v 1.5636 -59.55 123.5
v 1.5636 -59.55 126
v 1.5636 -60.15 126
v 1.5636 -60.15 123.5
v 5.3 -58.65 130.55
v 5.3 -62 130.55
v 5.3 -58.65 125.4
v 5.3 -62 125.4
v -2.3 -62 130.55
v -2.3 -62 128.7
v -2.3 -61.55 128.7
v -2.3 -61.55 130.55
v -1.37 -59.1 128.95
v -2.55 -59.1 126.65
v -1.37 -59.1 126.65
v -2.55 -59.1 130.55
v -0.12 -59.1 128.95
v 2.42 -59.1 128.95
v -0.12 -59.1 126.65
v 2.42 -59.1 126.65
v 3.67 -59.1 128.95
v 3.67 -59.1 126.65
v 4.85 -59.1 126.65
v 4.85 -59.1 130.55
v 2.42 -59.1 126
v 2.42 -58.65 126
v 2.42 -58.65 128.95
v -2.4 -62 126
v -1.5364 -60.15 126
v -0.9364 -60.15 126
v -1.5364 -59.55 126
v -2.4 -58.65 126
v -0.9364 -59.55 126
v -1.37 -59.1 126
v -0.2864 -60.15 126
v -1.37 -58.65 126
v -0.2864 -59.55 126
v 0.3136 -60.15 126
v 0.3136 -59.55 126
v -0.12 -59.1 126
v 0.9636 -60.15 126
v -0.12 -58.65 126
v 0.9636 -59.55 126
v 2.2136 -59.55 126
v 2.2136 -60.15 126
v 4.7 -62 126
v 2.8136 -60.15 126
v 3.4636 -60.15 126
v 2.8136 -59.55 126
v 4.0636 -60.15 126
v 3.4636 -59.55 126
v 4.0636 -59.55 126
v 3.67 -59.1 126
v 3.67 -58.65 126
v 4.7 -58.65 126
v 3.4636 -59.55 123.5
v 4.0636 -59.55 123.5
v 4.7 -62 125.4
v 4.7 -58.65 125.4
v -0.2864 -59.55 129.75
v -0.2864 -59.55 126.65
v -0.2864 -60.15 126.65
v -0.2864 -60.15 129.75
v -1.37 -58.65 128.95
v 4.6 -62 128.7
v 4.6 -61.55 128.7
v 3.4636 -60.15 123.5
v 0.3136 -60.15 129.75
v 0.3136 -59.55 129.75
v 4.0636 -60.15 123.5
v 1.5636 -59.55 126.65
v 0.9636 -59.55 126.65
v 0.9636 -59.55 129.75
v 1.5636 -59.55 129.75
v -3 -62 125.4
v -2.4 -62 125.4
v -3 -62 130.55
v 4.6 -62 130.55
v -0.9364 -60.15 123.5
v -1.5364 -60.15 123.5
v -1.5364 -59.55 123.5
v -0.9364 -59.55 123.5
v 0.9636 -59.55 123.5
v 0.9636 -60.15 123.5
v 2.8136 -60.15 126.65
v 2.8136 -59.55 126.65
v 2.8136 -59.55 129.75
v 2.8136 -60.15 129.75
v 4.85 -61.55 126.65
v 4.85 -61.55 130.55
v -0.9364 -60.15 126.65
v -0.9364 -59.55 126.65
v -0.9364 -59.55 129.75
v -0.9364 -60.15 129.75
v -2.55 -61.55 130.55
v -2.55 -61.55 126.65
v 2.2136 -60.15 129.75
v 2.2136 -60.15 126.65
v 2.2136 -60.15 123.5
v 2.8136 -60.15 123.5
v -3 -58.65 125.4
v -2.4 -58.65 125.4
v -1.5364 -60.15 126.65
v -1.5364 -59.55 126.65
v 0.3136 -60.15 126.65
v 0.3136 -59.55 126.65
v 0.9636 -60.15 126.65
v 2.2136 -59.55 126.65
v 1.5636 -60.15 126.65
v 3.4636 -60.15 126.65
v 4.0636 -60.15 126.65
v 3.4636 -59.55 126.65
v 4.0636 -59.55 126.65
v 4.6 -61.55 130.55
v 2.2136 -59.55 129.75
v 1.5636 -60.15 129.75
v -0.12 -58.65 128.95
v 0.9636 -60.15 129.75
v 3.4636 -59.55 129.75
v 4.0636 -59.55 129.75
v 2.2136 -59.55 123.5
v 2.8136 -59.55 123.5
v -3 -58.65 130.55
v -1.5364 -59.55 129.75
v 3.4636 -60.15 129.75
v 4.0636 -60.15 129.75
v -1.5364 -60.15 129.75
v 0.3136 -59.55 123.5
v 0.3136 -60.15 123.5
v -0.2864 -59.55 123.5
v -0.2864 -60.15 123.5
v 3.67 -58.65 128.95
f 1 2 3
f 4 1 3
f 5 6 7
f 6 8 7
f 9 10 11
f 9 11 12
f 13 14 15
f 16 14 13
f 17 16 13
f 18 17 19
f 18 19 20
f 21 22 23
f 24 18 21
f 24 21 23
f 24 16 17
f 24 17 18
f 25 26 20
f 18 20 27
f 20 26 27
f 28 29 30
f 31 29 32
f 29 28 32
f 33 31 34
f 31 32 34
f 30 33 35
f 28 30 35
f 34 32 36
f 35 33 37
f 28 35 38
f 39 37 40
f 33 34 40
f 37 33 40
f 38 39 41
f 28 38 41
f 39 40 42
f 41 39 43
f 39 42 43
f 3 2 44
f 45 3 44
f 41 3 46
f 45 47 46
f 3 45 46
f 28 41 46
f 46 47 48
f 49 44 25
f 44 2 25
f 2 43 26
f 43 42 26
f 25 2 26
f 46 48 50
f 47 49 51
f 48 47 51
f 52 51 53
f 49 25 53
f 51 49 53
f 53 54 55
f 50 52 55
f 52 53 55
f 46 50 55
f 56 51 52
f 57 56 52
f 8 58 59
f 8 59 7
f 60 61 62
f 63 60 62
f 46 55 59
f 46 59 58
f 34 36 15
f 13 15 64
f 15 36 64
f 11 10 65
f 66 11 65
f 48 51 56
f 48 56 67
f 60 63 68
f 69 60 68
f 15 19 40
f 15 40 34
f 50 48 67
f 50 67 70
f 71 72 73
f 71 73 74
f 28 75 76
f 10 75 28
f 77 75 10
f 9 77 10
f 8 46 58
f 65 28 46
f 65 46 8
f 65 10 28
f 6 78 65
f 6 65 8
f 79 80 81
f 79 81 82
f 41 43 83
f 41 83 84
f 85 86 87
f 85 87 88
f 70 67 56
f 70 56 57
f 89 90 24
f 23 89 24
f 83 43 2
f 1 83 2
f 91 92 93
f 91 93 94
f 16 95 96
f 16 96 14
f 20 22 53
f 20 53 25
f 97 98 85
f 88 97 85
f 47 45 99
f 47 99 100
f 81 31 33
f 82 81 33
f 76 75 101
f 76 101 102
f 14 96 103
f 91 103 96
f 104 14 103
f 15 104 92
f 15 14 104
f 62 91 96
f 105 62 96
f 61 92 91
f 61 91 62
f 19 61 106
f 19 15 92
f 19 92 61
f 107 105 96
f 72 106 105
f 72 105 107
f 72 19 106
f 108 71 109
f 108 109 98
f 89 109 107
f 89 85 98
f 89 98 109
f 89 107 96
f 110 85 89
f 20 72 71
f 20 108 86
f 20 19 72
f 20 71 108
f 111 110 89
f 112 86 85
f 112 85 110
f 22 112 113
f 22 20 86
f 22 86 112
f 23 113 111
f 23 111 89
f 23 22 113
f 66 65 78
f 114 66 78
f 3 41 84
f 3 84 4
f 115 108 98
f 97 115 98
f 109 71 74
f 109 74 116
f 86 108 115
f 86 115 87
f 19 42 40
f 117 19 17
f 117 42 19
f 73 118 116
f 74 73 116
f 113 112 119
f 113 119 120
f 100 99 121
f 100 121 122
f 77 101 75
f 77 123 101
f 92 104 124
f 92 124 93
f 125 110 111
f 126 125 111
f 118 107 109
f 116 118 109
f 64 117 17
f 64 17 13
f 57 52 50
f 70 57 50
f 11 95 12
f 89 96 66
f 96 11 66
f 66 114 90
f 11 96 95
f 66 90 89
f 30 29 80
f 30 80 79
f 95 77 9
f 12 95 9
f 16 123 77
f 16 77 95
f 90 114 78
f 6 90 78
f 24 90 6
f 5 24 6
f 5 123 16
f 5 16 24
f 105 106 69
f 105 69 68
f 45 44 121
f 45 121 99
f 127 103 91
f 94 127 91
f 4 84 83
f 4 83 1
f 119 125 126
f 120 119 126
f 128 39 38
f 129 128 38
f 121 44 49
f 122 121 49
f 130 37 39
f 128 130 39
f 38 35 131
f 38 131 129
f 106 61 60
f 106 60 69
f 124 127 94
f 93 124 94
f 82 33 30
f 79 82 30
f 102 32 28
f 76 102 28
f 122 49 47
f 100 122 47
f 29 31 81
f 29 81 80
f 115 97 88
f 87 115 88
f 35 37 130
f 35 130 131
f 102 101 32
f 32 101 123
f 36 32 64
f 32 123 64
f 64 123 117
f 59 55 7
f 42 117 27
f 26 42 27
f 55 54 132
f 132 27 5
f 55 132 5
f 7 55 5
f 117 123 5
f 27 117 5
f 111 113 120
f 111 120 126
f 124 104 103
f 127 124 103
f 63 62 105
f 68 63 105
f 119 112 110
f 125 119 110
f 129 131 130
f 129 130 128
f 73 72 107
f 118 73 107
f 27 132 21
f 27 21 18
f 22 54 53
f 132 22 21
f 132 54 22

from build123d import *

# Parameters (mm, degrees)
SKETCH019_W     = 8.3
SKETCH019_H     = 3.35
PAD009_DEPTH    = 4.55
SKETCH020_W     = 0.6
SKETCH020_H     = 3.35
PAD010_DEPTH    = 0.6
SKETCH021_W     = 7.4
SKETCH021_H     = 2.45
POCKET005_DEPTH = 3.9
SKETCH022_W     = 6.9
SKETCH022_H     = 1.85
POCKET006_DEPTH = 0.45
SKETCH023_W     = 0.6
SKETCH023_H     = 0.6
PAD011_DEPTH    = 2.5
SKETCH024_W     = 0.6
SKETCH024_H     = 0.6
PAD012_DEPTH    = 3.75
SKETCH025_W     = 1.25
SKETCH025_H     = 2.95
POCKET007_DEPTH = 0.45


with BuildPart() as part:
    # Sketch019 → Pad009 (new body)
    with BuildSketch(Plane.XY):
        with Locations((4.15, 1.675)):
            Rectangle(SKETCH019_W, SKETCH019_H)
    extrude(amount=PAD009_DEPTH)

    # Sketch020 (on Face5 of Pad009) → Pad010 (join)
    with BuildSketch(Plane(origin=(0, 0, 0), x_dir=(1, 0, 0), z_dir=(0, 0, -1))):
        with Locations((0.3, -1.675)):
            Rectangle(SKETCH020_W, SKETCH020_H)
        with Locations((8, -1.675)):
            Rectangle(SKETCH020_W, SKETCH020_H)
    extrude(amount=PAD010_DEPTH)

    # Sketch021 (on Face7 of Pad010) → Pocket005 (cut)
    with BuildSketch(Plane.XY.offset(4.55)):
        with Locations((4.15, 1.675)):
            Rectangle(SKETCH021_W, SKETCH021_H)
    extrude(amount=-POCKET005_DEPTH, mode=Mode.SUBTRACT)

    # Sketch022 (on Face1 of Pocket005) → Pocket006 (cut)
    with BuildSketch(Plane.XZ):
        with Locations((4.15, 3.625)):
            Rectangle(SKETCH022_W, SKETCH022_H)
    extrude(amount=-POCKET006_DEPTH, mode=Mode.SUBTRACT)

    # Sketch023 (on Face3 of Pocket006) → Pad011 (join)
    with BuildSketch(Plane(origin=(0, 0, 0), x_dir=(1, 0, 0), z_dir=(0, 0, -1))):
        with Locations((1.76363, -2.15)):
            Rectangle(SKETCH023_W, SKETCH023_H)
        with Locations((3.01363, -2.15)):
            Rectangle(SKETCH023_W, SKETCH023_H)
        with Locations((4.26363, -2.15)):
            Rectangle(SKETCH023_W, SKETCH023_H)
        with Locations((5.51363, -2.15)):
            Rectangle(SKETCH023_W, SKETCH023_H)
        with Locations((6.76363, -2.15)):
            Rectangle(SKETCH023_W, SKETCH023_H)
    extrude(amount=PAD011_DEPTH)

    # Sketch024 (on Face3 of Pad011) → Pad012 (join)
    with BuildSketch(Plane(origin=(0, 0, 0), x_dir=(1, 0, 0), z_dir=(0, 0, -1))):
        with Locations((1.76363, -2.15)):
            Rectangle(SKETCH024_W, SKETCH024_H)
        with Locations((3.01363, -2.15)):
            Rectangle(SKETCH024_W, SKETCH024_H)
        with Locations((4.26363, -2.15)):
            Rectangle(SKETCH024_W, SKETCH024_H)
        with Locations((5.51363, -2.15)):
            Rectangle(SKETCH024_W, SKETCH024_H)
        with Locations((6.76363, -2.15)):
            Rectangle(SKETCH024_W, SKETCH024_H)
    extrude(amount=-PAD012_DEPTH)

    # Sketch025 (on Face14 of Pad012) → Pocket007 (cut)
    with BuildSketch(Plane(origin=(0, 3.35, 0), x_dir=(-1, 0, 0), z_dir=(0, 1, 0))):
        with Locations((-6.045, 1.475)):
            Rectangle(SKETCH025_W, SKETCH025_H)
        with Locations((-2.255, 1.475)):
            Rectangle(SKETCH025_W, SKETCH025_H)
    extrude(amount=-POCKET007_DEPTH, mode=Mode.SUBTRACT)


with BuildPart() as part_1:
    # Body002 placement: moved
    add(part.part.moved(Location((-3, -62, 126))))


solid = part_1.part
